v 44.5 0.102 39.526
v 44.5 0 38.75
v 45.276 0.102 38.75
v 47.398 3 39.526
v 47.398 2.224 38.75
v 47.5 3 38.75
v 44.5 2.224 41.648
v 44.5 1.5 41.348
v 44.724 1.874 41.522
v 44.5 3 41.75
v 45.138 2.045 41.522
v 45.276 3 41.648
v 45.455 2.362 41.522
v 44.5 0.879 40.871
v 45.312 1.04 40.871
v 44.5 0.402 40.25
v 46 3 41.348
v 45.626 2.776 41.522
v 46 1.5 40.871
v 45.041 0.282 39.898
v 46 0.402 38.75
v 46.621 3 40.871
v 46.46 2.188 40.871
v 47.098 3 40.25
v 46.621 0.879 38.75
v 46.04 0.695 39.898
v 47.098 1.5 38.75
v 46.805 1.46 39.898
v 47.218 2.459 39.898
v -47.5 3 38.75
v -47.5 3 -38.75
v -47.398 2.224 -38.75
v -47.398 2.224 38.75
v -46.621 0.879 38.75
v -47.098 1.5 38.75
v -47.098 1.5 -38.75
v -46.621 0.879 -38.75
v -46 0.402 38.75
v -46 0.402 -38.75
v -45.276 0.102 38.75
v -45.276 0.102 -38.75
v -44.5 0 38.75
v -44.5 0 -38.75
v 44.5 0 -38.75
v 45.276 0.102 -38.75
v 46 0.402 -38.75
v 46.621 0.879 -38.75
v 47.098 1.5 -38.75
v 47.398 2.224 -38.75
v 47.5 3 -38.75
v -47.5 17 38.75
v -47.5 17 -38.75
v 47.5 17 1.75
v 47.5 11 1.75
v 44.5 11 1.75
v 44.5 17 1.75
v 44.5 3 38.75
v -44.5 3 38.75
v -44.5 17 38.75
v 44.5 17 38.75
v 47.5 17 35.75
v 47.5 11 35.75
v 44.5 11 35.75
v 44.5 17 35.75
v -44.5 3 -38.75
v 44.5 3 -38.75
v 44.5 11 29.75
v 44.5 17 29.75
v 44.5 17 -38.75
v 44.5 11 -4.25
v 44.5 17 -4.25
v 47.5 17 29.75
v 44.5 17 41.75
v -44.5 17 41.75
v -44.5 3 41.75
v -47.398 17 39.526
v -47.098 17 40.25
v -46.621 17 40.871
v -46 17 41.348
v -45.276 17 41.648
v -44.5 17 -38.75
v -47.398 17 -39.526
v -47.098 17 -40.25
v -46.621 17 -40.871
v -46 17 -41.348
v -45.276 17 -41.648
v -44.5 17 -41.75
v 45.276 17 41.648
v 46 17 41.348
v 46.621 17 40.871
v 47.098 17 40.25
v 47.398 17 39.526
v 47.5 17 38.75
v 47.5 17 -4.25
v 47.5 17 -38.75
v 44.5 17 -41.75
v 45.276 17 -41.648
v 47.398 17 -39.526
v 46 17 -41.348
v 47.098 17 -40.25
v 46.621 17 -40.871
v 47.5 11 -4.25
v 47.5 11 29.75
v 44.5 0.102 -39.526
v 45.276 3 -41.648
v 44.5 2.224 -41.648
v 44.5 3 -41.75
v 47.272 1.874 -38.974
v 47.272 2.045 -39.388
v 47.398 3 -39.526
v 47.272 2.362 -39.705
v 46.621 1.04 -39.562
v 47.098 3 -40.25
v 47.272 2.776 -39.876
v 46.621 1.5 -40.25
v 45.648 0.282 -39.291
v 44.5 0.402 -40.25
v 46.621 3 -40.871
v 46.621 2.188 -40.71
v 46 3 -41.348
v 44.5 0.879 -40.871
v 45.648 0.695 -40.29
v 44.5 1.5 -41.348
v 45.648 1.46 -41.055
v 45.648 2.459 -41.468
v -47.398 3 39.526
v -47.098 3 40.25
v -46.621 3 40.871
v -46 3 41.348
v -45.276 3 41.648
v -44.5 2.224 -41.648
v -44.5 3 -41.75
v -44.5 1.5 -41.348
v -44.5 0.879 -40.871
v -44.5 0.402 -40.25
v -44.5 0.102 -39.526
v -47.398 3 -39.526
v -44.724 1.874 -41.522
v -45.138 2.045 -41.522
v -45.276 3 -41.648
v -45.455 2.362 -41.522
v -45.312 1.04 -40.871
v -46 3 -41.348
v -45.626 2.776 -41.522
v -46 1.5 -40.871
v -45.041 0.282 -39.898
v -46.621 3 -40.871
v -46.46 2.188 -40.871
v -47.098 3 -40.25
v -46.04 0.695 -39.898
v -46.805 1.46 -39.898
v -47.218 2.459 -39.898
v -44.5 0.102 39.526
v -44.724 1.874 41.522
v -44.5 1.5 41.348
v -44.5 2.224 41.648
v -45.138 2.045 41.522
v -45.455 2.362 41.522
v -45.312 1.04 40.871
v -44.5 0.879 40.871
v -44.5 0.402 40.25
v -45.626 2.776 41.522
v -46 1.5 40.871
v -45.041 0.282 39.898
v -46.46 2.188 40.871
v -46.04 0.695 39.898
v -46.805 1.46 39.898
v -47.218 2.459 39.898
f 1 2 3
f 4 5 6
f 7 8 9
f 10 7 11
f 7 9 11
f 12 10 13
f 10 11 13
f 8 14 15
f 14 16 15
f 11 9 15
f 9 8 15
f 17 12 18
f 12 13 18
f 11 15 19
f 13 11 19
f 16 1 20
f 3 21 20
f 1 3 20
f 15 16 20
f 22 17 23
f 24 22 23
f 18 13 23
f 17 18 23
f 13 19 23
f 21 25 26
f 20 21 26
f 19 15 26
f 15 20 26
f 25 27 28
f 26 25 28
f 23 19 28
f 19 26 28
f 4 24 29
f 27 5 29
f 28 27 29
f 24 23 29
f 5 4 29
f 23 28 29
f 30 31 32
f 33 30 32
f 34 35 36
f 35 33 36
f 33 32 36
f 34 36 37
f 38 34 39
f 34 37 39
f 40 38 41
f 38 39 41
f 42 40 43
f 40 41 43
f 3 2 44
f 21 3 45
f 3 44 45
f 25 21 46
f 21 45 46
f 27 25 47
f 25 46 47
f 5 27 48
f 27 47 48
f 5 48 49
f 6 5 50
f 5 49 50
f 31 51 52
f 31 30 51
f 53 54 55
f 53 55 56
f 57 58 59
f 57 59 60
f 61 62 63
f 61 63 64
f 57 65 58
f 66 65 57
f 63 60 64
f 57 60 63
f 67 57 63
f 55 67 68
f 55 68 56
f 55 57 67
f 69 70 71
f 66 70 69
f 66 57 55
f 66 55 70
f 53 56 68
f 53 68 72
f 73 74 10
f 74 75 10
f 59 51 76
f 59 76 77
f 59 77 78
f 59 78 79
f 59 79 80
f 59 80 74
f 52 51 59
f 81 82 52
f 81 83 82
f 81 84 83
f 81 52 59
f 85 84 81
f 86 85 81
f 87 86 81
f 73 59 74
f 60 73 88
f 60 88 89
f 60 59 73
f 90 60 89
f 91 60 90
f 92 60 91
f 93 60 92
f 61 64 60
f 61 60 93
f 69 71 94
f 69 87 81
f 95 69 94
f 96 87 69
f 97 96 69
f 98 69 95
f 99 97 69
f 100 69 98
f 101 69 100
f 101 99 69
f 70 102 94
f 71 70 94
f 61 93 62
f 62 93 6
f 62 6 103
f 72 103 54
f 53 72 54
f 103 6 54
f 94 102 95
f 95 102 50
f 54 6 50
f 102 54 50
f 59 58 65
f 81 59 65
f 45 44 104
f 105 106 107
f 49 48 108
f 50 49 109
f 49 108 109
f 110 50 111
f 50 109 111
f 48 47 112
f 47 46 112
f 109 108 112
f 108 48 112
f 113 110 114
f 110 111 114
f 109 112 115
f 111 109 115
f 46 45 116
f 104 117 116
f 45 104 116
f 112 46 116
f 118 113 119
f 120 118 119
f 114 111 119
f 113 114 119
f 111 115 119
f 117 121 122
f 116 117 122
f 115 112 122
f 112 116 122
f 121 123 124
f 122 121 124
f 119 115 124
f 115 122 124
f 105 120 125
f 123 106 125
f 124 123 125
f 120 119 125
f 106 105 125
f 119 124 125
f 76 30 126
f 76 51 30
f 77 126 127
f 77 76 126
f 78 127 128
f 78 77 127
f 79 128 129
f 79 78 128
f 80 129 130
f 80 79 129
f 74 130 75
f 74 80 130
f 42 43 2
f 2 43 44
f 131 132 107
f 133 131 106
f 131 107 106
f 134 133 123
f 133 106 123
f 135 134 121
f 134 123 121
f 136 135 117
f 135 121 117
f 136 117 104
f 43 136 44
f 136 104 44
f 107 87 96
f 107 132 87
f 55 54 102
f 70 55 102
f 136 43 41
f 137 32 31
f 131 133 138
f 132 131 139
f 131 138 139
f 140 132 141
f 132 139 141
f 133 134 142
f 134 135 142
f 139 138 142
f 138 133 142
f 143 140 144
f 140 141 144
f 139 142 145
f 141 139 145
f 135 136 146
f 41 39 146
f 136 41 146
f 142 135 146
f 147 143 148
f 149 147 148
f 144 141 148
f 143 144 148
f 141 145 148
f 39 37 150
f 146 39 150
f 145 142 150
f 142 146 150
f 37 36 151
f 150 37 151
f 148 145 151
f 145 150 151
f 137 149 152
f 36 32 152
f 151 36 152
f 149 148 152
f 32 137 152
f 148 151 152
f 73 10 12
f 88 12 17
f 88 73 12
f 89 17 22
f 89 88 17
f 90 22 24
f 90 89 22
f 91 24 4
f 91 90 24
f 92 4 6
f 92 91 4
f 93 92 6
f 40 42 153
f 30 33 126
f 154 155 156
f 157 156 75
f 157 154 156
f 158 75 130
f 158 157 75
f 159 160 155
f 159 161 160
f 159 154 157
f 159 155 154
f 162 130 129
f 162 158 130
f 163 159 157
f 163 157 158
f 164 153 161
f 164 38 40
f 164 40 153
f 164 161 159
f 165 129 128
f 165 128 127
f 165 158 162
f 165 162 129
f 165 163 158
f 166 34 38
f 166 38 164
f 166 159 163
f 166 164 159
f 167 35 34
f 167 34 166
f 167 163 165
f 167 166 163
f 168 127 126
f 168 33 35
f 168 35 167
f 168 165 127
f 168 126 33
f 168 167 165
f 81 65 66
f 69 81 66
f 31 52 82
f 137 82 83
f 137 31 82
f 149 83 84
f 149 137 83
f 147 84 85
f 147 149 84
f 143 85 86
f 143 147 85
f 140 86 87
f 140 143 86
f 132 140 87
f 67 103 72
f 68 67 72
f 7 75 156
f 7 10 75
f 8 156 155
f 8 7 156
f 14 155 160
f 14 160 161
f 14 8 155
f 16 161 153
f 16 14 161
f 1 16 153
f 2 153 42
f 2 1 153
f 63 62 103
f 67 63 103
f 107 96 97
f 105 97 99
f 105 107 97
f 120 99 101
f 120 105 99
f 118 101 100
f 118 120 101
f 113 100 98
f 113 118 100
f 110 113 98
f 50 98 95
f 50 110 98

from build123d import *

# Parameters (mm, degrees)
SKETCH1_W           = 95
SKETCH1_H           = 83.5
SKETCH1_W_2         = 89
SKETCH1_H_2         = 77.5
BOSS_EXTRUDE1_DEPTH = 3
SKETCH1_3_W         = 95
SKETCH1_3_H         = 83.5
SKETCH1_3_W_2       = 89
SKETCH1_3_H_2       = 77.5
BOSS_EXTRUDE2_DEPTH = 17
CUT_EXTRUDE1_REACH  = 97
SKETCH2_W           = 6
SKETCH2_H           = 6
FILLET1_R           = 3


with BuildPart() as part:
    # Sketch1 → Boss-Extrude1 (new body)
    with BuildSketch(Plane(origin=(0, 0, 0), x_dir=(1, 0, 0), z_dir=(0, 1, 0))):
        Rectangle(SKETCH1_W, SKETCH1_H)
        Rectangle(SKETCH1_W_2, SKETCH1_H_2, mode=Mode.SUBTRACT)
        Rectangle(SKETCH1_W_2, SKETCH1_H_2)
    extrude(amount=BOSS_EXTRUDE1_DEPTH)

    # Sketch1_3 → Boss-Extrude2 (add)
    with BuildSketch(Plane(origin=(0, 0, 0), x_dir=(1, 0, 0), z_dir=(0, 1, 0))):
        Rectangle(SKETCH1_3_W, SKETCH1_3_H)
        Rectangle(SKETCH1_3_W_2, SKETCH1_3_H_2, mode=Mode.SUBTRACT)
    extrude(amount=BOSS_EXTRUDE2_DEPTH)

    # Sketch2 → Cut-Extrude1 (cut, up to next)
    with BuildSketch(Plane(origin=(47.5, 0, 0), x_dir=(0, 0, -1), z_dir=(1, 0, 0)), mode=Mode.PRIVATE) as cut_extrude1_sk1:
        with Locations((-32.75, 14)):
            Rectangle(SKETCH2_W, SKETCH2_H)
    cut_extrude1_tool1 = extrude(cut_extrude1_sk1.sketch, amount=-CUT_EXTRUDE1_REACH, mode=Mode.PRIVATE) & part.part
    add(cut_extrude1_tool1.solids().sort_by_distance((47.5, 14, 32.75))[0], mode=Mode.SUBTRACT)
    # Sketch2 → Cut-Extrude1 (cut, up to next)
    with BuildSketch(Plane(origin=(47.5, 0, 0), x_dir=(0, 0, -1), z_dir=(1, 0, 0)), mode=Mode.PRIVATE) as cut_extrude1_sk2:
        with Locations((1.25, 14)):
            Rectangle(SKETCH2_W, SKETCH2_H)
    cut_extrude1_tool2 = extrude(cut_extrude1_sk2.sketch, amount=-CUT_EXTRUDE1_REACH, mode=Mode.PRIVATE) & part.part
    add(cut_extrude1_tool2.solids().sort_by_distance((47.5, 14, -1.25))[0], mode=Mode.SUBTRACT)

    # Fillet1
    fillet1_edges = [part.edges().sort_by_distance(p)[0] for p in [
        (-47.5, 0, 0),
        (0, 0, -41.75),
        (47.5, 0, 0),
        (0, 0, 41.75),
        (-47.5, 8.5, 41.75),
        (-47.5, 8.5, -41.75),
        (47.5, 8.5, -41.75),
        (47.5, 8.5, 41.75),
    ]]
    fillet(fillet1_edges, radius=FILLET1_R)


solid = part.part
